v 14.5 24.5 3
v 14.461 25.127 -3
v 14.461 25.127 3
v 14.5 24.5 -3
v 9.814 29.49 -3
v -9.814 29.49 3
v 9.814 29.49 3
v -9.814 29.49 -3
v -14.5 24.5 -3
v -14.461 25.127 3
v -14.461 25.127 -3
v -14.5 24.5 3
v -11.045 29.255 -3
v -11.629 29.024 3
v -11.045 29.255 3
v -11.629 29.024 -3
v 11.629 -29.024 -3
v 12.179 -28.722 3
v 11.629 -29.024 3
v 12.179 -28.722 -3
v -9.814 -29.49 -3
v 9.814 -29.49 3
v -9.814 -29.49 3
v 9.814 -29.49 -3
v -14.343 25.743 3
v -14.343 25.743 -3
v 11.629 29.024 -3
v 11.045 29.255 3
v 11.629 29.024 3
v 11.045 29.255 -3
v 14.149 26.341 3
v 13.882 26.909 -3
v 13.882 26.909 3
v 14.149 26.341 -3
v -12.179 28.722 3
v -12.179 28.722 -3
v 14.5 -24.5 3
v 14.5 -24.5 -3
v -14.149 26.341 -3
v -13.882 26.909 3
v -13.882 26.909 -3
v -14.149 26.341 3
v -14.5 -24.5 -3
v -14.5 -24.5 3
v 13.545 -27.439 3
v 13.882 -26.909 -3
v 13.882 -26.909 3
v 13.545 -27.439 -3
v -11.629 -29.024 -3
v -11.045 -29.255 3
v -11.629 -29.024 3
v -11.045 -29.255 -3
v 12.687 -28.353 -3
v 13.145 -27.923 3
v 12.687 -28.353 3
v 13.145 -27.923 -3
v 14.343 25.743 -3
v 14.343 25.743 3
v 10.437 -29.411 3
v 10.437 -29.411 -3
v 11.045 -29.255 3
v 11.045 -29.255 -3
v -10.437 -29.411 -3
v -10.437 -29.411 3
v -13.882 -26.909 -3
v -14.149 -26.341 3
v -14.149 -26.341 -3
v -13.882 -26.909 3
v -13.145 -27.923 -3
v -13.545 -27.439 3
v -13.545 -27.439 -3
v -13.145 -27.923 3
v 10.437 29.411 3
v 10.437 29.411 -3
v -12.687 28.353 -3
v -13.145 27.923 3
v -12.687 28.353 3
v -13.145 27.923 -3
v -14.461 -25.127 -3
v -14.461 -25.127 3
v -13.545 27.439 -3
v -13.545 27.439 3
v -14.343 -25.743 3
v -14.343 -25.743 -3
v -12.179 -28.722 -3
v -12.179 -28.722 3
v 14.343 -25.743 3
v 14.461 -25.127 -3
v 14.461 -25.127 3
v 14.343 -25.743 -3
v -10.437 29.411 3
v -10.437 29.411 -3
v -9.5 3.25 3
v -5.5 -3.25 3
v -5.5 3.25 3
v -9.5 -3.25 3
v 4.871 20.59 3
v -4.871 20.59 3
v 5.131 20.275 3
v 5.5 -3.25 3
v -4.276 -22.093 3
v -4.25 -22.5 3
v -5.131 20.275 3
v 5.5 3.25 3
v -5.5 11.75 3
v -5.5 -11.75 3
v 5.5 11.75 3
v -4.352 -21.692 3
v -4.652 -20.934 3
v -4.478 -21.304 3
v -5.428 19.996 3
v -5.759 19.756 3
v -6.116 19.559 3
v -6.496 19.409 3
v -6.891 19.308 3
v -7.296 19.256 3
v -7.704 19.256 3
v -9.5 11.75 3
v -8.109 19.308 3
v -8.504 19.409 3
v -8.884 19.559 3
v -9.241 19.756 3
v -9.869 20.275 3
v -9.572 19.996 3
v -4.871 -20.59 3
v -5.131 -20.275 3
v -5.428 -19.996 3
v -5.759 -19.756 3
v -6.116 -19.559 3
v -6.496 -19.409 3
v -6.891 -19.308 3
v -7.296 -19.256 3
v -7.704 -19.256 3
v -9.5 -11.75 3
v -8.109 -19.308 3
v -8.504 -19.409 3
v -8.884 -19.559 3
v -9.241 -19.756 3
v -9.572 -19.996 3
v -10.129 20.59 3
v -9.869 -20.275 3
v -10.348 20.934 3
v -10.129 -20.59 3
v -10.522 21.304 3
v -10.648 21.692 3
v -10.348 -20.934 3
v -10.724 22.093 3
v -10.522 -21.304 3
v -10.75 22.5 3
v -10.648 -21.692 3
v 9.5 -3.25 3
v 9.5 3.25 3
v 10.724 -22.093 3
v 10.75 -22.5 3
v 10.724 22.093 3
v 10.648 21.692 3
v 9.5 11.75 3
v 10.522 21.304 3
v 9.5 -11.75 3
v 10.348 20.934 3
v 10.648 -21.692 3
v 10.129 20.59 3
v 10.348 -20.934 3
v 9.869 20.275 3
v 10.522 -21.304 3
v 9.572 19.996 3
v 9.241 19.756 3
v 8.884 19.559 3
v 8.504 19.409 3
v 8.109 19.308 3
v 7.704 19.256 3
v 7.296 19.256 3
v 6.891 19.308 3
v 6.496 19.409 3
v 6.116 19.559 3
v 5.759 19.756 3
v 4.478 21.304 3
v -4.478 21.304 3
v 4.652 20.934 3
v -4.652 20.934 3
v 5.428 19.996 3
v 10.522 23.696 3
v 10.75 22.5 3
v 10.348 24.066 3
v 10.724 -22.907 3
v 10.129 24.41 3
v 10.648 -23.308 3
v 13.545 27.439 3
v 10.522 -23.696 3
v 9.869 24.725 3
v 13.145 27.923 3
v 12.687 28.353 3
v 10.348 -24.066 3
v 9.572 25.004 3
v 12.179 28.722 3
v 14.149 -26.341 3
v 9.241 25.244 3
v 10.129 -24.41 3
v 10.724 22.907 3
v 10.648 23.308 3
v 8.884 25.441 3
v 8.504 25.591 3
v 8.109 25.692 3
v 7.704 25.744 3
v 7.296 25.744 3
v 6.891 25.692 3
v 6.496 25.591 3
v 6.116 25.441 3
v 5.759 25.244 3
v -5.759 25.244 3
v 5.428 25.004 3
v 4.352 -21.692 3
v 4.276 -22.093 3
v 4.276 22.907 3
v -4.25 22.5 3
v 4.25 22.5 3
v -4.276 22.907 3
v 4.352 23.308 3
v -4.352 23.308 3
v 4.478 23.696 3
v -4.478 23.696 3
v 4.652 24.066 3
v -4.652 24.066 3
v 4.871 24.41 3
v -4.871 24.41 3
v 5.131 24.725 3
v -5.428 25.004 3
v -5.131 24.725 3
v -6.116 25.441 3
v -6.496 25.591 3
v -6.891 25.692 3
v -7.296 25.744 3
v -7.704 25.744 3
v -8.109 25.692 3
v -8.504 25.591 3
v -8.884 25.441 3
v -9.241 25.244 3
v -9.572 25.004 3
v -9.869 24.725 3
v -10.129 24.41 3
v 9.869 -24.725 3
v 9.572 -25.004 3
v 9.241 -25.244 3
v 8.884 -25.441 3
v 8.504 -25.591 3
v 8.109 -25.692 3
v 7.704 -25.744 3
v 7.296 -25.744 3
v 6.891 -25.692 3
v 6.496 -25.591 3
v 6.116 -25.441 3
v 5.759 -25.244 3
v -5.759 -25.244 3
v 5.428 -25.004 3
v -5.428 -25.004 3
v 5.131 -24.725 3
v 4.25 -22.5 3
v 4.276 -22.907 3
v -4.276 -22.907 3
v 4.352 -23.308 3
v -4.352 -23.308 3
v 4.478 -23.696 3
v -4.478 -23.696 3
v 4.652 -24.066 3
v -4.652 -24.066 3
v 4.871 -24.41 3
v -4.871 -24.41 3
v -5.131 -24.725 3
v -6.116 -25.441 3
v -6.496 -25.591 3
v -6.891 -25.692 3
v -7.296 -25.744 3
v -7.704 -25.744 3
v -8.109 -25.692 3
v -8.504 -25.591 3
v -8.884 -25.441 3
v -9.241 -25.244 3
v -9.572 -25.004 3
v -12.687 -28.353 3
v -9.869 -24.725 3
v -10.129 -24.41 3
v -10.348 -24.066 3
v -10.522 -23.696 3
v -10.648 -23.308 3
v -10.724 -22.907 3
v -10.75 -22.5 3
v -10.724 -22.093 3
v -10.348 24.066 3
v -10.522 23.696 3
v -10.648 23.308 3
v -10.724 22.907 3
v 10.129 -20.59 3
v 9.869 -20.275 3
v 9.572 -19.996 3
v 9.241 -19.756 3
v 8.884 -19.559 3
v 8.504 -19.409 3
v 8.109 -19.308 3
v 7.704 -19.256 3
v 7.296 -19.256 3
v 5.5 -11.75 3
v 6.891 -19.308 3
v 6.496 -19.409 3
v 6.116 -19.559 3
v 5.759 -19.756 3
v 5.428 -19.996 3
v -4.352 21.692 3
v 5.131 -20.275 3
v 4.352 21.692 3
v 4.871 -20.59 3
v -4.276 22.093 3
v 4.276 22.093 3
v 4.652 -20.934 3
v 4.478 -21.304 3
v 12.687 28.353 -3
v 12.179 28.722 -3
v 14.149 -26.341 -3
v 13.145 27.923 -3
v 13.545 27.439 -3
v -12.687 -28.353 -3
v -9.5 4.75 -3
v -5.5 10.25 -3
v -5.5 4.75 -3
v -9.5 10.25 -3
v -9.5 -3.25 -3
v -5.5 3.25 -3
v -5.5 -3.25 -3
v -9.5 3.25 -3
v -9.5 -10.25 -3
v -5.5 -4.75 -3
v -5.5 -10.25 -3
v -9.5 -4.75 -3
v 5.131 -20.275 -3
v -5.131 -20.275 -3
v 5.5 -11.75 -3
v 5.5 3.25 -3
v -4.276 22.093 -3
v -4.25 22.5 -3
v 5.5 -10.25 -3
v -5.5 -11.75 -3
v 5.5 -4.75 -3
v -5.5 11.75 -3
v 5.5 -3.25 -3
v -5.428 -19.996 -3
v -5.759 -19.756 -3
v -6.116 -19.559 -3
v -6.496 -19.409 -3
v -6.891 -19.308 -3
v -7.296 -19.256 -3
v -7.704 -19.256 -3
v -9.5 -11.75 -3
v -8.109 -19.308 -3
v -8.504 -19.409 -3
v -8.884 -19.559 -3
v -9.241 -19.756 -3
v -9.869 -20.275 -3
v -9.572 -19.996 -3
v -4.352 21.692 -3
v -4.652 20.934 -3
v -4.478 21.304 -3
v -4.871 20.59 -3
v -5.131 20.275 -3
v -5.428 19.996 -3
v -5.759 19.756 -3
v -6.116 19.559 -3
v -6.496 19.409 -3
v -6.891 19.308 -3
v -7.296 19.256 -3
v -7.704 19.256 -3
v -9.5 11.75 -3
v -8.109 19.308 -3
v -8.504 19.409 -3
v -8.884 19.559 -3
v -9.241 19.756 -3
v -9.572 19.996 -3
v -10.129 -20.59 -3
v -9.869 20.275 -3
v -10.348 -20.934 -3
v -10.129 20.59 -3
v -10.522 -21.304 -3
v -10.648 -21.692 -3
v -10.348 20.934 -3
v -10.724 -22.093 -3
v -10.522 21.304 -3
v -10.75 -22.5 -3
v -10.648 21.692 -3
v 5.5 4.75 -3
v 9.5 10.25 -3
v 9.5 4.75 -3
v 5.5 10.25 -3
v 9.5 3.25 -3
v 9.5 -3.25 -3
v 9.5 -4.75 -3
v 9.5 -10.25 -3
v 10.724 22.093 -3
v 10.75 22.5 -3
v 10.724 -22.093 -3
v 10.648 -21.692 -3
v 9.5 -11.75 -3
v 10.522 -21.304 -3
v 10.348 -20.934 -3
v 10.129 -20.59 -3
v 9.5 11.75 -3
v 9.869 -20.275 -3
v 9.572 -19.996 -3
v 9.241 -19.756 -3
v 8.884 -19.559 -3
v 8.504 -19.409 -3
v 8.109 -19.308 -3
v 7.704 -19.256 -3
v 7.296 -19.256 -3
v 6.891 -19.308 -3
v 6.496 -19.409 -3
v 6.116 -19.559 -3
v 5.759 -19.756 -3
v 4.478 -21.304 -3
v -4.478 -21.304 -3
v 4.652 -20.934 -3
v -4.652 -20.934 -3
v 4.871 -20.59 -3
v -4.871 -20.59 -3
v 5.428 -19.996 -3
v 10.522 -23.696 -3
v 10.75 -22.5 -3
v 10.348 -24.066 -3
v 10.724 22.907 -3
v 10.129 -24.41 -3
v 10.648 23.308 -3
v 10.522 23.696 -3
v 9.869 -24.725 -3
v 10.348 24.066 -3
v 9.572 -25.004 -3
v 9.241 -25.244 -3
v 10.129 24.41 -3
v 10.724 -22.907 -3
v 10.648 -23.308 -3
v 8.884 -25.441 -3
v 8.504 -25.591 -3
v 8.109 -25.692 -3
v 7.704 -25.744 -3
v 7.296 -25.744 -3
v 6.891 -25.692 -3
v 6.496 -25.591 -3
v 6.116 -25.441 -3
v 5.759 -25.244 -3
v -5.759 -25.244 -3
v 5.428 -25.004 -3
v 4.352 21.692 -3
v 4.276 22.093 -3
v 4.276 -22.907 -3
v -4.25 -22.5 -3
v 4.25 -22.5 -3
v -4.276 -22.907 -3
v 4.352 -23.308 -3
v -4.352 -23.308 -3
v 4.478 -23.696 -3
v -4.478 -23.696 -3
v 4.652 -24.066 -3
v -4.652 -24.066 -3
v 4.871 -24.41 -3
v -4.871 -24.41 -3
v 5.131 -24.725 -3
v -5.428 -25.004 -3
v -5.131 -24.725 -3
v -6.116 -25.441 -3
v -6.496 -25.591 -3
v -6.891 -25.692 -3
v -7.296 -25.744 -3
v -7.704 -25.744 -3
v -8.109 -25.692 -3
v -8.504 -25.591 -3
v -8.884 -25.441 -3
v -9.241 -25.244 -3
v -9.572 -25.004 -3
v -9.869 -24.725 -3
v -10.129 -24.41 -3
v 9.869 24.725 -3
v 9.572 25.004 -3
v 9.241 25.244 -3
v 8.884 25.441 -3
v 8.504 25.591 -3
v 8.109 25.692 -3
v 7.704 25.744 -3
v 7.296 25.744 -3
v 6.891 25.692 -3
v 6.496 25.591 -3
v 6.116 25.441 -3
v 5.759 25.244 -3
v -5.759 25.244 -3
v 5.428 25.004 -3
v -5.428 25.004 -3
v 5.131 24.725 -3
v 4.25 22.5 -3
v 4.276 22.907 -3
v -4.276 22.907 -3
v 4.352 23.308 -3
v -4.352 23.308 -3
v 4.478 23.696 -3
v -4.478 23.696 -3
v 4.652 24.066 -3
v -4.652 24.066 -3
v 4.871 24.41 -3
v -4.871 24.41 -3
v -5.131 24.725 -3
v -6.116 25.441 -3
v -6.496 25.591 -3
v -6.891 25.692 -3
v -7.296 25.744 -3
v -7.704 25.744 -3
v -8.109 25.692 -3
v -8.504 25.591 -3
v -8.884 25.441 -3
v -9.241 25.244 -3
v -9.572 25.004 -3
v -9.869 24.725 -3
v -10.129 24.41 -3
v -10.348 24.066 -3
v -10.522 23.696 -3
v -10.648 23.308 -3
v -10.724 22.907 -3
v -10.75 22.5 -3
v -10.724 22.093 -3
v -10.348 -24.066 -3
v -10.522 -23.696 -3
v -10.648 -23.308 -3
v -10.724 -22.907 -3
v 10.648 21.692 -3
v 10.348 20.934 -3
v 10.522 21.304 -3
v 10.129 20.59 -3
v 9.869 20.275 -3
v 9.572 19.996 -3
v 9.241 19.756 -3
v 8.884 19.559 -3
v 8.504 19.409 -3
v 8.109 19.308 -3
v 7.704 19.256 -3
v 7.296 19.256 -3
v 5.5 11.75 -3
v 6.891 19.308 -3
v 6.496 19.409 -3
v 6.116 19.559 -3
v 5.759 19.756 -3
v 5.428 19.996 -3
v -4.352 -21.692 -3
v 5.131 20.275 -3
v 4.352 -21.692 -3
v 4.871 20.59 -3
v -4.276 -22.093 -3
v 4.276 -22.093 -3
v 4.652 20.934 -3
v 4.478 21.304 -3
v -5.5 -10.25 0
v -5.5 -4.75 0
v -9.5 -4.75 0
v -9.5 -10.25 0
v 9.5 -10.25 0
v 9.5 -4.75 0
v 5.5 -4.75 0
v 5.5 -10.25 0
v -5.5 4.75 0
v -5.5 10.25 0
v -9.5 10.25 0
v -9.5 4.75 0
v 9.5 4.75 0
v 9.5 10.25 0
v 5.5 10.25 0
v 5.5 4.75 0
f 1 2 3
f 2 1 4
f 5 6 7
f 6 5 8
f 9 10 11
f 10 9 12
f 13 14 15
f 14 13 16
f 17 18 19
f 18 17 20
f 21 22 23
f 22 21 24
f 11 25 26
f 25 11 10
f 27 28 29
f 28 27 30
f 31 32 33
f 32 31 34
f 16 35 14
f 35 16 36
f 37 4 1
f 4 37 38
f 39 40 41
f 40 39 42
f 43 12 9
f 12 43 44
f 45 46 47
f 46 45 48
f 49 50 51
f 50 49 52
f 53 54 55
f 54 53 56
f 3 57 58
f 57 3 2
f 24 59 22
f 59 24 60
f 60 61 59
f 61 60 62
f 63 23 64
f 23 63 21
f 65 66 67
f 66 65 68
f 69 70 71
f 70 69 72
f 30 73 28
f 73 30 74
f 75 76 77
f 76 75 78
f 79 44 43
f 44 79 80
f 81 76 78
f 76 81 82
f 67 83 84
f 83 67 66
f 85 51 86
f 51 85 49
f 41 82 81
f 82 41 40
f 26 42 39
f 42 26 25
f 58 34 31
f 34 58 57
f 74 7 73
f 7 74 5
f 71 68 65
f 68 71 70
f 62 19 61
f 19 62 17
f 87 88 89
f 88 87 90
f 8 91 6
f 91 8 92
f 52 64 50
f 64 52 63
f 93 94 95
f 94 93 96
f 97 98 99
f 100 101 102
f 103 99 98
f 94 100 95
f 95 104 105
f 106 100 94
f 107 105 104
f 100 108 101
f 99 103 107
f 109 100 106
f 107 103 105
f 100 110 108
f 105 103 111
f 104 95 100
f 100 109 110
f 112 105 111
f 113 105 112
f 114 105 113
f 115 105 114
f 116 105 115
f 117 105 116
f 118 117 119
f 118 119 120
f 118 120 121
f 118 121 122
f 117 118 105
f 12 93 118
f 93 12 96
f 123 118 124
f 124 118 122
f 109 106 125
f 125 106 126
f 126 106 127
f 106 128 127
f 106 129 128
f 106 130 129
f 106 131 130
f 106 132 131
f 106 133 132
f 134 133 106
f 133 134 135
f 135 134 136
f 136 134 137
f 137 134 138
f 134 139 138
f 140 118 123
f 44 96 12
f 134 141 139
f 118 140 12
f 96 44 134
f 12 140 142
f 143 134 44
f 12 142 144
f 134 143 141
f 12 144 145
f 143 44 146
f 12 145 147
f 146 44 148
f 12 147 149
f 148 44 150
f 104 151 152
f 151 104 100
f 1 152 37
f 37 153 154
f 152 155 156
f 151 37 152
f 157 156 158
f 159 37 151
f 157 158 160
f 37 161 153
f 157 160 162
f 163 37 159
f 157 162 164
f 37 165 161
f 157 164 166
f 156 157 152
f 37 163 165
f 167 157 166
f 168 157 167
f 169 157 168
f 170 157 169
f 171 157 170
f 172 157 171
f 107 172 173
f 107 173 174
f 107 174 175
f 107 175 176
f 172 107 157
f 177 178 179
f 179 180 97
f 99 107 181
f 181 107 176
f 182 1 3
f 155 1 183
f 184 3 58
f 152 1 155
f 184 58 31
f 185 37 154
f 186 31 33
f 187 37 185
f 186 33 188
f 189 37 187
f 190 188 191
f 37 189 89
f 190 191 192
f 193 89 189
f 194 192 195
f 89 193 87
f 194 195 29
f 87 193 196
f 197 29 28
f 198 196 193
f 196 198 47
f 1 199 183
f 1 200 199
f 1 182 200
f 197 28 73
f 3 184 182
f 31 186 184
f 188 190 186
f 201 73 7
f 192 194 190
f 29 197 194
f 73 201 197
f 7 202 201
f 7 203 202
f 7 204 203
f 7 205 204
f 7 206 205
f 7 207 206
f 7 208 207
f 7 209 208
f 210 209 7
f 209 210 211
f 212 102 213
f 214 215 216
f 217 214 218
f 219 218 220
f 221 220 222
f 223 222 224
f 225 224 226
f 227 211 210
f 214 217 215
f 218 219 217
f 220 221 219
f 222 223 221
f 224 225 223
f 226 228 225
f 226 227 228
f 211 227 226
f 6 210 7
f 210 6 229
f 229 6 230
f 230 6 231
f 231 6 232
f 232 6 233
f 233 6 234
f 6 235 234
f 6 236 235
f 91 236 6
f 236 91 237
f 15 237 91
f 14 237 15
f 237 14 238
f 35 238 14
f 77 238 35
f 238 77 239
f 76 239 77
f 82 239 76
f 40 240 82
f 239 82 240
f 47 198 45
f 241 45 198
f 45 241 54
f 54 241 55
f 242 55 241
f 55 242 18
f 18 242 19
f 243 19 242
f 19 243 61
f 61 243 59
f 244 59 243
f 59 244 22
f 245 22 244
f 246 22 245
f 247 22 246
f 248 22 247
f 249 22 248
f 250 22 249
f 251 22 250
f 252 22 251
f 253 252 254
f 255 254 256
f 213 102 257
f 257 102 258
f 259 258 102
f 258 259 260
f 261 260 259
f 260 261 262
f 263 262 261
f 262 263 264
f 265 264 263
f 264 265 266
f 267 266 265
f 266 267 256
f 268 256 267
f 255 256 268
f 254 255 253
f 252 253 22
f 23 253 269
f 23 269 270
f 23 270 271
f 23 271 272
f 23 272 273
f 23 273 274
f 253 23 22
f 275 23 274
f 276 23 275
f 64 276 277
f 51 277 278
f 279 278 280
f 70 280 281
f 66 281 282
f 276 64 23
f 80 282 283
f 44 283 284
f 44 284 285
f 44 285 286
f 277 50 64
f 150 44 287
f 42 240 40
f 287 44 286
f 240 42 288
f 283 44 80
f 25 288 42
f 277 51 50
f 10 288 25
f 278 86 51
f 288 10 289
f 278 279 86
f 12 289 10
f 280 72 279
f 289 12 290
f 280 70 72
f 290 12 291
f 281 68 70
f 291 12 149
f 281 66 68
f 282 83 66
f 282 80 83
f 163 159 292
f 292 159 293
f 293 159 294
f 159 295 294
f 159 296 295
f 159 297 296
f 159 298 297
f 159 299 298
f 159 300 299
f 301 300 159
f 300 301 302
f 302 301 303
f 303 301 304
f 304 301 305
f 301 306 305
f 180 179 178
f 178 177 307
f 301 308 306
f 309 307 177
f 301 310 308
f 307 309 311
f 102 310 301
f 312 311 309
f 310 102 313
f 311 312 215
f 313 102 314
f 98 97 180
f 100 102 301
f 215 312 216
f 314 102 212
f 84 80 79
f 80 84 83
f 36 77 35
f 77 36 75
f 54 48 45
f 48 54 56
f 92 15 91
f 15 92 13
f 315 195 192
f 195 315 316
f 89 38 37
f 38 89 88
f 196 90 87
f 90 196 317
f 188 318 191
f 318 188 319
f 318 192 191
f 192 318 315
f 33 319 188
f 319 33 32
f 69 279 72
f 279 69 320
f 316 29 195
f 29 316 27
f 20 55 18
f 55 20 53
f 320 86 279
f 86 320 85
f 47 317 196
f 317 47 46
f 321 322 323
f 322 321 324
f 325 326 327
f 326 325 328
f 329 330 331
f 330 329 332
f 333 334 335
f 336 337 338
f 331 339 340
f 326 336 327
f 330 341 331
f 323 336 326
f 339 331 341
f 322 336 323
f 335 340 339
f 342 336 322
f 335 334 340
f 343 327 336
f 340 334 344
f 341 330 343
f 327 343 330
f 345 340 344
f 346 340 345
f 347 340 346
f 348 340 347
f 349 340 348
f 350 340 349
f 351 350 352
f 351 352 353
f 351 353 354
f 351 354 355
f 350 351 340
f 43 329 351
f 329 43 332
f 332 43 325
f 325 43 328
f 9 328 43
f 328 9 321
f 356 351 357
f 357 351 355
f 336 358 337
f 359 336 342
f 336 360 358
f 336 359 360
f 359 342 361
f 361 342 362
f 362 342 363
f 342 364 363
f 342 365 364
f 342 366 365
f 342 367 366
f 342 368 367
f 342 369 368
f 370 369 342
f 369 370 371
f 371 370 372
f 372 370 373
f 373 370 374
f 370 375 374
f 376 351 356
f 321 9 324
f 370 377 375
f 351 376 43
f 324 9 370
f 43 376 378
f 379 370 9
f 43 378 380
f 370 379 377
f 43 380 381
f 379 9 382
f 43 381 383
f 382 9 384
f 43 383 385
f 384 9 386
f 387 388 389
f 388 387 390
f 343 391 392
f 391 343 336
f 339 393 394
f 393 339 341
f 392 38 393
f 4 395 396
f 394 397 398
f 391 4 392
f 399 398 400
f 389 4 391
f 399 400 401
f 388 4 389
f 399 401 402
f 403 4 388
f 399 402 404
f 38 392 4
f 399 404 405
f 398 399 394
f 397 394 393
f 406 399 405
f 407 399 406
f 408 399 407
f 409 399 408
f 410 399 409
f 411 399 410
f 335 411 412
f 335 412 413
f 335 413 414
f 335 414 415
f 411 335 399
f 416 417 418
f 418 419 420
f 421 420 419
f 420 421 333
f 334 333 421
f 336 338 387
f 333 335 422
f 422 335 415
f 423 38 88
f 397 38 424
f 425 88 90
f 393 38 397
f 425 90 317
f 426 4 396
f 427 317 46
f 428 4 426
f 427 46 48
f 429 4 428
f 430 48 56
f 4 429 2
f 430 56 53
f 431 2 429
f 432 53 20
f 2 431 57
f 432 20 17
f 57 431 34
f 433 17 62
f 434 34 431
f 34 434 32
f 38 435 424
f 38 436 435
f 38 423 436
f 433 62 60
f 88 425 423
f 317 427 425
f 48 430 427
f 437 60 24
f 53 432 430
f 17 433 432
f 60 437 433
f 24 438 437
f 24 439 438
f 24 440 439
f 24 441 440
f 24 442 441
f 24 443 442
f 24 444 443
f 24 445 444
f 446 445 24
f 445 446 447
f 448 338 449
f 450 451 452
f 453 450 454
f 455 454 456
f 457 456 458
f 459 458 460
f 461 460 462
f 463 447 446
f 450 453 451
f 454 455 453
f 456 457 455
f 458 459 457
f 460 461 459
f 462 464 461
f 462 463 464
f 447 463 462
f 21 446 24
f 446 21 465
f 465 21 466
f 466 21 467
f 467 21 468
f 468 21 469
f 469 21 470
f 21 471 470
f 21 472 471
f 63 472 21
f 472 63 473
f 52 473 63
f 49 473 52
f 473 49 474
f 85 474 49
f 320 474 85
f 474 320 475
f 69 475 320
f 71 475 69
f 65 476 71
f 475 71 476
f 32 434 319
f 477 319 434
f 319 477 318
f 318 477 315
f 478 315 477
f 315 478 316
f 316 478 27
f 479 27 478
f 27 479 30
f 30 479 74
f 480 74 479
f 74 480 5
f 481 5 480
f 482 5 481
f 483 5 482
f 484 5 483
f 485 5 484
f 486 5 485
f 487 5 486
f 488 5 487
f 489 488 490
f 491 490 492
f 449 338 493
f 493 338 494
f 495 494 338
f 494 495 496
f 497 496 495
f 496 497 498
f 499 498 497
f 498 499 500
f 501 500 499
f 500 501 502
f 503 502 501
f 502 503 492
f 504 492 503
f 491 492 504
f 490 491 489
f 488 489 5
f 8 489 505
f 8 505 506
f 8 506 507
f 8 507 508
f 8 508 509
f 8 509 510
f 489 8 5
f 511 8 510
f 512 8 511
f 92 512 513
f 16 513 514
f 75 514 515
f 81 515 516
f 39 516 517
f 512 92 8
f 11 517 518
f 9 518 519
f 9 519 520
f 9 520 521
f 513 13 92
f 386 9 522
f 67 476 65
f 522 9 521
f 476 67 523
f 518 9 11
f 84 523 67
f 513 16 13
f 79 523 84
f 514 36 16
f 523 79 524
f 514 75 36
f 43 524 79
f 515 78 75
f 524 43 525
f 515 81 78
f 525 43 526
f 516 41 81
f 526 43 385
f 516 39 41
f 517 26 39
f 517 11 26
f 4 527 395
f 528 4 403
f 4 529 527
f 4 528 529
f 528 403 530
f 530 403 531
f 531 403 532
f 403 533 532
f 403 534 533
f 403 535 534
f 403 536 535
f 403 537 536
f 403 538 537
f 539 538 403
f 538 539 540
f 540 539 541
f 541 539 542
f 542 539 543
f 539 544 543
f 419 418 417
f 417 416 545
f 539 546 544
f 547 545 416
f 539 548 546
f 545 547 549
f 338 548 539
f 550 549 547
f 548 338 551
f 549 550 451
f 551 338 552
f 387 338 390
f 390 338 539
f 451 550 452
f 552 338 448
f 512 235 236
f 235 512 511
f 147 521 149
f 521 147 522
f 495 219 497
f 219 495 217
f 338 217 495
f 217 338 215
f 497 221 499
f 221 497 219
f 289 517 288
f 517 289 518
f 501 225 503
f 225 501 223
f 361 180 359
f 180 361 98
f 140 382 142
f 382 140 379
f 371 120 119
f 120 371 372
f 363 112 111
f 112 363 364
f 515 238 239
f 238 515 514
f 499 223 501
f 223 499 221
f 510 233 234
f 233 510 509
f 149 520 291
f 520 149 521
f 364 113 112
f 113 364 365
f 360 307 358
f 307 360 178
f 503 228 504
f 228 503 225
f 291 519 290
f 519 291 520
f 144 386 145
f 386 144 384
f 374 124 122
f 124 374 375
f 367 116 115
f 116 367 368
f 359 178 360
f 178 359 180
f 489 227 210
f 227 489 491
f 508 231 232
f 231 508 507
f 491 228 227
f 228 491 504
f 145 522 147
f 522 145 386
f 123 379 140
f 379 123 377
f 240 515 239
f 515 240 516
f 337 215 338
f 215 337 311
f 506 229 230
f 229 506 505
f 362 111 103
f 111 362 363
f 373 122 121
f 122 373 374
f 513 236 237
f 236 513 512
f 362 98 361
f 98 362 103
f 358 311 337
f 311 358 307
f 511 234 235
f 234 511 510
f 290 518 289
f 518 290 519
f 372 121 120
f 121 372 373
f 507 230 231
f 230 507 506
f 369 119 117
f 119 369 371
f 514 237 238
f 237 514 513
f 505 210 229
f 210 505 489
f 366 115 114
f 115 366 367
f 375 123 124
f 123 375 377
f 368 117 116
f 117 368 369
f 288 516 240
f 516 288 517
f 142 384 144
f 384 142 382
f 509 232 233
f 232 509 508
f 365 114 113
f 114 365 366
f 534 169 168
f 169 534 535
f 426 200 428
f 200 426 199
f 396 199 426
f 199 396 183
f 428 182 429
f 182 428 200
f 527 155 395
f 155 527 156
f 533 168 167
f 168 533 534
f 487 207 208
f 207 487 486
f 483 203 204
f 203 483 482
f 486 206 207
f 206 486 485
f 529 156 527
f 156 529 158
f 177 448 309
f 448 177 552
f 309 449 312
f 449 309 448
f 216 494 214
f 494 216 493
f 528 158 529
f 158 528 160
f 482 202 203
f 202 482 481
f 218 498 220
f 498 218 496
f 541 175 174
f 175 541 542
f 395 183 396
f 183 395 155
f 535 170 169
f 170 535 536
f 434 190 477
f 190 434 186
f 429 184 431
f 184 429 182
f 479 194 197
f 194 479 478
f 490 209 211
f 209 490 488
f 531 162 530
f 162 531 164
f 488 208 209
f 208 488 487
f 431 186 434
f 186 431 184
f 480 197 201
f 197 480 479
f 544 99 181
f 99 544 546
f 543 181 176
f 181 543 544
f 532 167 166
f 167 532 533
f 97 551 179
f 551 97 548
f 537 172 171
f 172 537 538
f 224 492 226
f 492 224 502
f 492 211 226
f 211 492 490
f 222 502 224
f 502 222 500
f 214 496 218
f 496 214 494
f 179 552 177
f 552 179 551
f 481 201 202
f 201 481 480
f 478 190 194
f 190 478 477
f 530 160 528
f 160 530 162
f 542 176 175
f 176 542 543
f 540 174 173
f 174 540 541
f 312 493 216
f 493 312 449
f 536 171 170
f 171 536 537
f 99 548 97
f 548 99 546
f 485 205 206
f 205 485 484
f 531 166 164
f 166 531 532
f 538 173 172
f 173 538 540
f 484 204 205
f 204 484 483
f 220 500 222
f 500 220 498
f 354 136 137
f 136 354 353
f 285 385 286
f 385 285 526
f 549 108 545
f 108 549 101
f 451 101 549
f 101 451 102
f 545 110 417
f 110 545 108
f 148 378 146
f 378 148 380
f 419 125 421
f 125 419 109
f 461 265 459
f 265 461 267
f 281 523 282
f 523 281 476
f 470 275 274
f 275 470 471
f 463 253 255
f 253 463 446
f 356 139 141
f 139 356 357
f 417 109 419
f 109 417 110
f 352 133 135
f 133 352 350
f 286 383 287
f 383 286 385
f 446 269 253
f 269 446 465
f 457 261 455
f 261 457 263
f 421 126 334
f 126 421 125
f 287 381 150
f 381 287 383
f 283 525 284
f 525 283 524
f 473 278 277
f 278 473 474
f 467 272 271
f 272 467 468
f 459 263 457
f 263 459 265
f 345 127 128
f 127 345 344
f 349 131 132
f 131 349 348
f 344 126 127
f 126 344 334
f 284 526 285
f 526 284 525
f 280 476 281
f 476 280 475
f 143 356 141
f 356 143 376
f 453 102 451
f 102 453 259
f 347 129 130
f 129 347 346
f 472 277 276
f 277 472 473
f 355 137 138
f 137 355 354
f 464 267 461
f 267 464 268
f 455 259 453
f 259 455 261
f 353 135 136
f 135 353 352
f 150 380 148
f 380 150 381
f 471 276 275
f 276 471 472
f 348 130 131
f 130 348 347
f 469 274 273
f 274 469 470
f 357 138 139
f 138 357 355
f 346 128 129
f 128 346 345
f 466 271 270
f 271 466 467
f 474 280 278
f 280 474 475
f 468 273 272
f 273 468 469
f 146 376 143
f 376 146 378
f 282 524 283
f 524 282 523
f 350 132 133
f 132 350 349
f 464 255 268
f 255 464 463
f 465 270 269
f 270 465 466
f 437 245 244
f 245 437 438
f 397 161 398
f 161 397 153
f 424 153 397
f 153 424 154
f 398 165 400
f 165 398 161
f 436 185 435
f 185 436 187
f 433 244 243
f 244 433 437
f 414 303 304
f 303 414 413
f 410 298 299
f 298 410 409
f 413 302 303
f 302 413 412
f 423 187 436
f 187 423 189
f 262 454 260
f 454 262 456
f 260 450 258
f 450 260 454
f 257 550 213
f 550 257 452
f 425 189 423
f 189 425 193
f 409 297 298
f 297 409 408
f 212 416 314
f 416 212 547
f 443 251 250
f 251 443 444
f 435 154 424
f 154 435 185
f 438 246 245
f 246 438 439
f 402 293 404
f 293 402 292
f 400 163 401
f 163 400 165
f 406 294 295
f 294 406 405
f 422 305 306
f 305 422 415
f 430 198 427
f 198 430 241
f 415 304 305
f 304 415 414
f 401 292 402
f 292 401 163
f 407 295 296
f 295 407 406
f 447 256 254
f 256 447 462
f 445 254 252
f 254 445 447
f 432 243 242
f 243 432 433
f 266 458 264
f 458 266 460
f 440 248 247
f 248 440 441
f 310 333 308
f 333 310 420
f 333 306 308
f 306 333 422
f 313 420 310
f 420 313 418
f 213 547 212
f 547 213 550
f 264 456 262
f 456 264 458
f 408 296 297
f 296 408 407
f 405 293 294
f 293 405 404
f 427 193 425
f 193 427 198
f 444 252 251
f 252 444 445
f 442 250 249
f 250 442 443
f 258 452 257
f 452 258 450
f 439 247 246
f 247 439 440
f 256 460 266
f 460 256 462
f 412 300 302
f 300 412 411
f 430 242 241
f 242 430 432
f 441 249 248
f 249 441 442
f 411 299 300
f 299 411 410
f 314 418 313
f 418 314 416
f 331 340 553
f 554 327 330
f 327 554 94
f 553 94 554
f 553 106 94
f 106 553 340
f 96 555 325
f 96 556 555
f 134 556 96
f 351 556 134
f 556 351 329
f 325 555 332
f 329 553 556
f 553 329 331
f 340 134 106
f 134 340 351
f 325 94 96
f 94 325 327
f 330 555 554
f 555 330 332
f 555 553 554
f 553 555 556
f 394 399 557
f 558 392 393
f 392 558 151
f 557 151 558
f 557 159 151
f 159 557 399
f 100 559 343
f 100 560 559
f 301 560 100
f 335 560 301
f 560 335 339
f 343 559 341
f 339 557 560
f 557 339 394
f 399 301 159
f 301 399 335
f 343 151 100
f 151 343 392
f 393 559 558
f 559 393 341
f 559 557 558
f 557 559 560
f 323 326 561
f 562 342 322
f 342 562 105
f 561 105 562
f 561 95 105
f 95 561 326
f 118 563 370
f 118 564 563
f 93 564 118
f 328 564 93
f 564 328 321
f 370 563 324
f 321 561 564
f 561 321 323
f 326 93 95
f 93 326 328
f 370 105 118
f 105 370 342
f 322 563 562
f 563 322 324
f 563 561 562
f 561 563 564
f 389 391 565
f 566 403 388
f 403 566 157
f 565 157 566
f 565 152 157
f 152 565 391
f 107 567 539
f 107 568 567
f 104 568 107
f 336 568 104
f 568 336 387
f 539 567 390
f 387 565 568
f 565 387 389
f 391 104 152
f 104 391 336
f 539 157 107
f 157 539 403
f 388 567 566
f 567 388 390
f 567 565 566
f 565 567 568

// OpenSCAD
$fn = 50;


difference() {
	union() {
		translate(v = [0, 0, -3.0000000000]) {
			hull() {
				translate(v = [-9.5000000000, 24.5000000000, 0]) {
					cylinder(h = 6, r = 5);
				}
				translate(v = [9.5000000000, 24.5000000000, 0]) {
					cylinder(h = 6, r = 5);
				}
				translate(v = [-9.5000000000, -24.5000000000, 0]) {
					cylinder(h = 6, r = 5);
				}
				translate(v = [9.5000000000, -24.5000000000, 0]) {
					cylinder(h = 6, r = 5);
				}
			}
		}
		translate(v = [0, 0, -3.0000000000]) {
			hull() {
				translate(v = [-9.5000000000, 24.5000000000, 0]) {
					cylinder(h = 6, r = 5);
				}
				translate(v = [9.5000000000, 24.5000000000, 0]) {
					cylinder(h = 6, r = 5);
				}
				translate(v = [-9.5000000000, -24.5000000000, 0]) {
					cylinder(h = 6, r = 5);
				}
				translate(v = [9.5000000000, -24.5000000000, 0]) {
					cylinder(h = 6, r = 5);
				}
			}
		}
	}
	union() {
		translate(v = [-7.5000000000, 22.5000000000, -100.0000000000]) {
			cylinder(h = 200, r = 3.2500000000);
		}
		translate(v = [7.5000000000, 22.5000000000, -100.0000000000]) {
			cylinder(h = 200, r = 3.2500000000);
		}
		translate(v = [-7.5000000000, -22.5000000000, -100.0000000000]) {
			cylinder(h = 200, r = 3.2500000000);
		}
		translate(v = [7.5000000000, -22.5000000000, -100.0000000000]) {
			cylinder(h = 200, r = 3.2500000000);
		}
		translate(v = [-9.5000000000, -11.7500000000, -50]) {
			cube(size = [4, 1.5000000000, 100]);
		}
		translate(v = [-9.5000000000, -4.7500000000, -50]) {
			cube(size = [4, 1.5000000000, 100]);
		}
		translate(v = [-9.5000000000, -11.7500000000, 0]) {
			cube(size = [4, 8.5000000000, 3]);
		}
		translate(v = [5.5000000000, -11.7500000000, -50]) {
			cube(size = [4, 1.5000000000, 100]);
		}
		translate(v = [5.5000000000, -4.7500000000, -50]) {
			cube(size = [4, 1.5000000000, 100]);
		}
		translate(v = [5.5000000000, -11.7500000000, 0]) {
			cube(size = [4, 8.5000000000, 3]);
		}
		translate(v = [-9.5000000000, 3.2500000000, -50]) {
			cube(size = [4, 1.5000000000, 100]);
		}
		translate(v = [-9.5000000000, 10.2500000000, -50]) {
			cube(size = [4, 1.5000000000, 100]);
		}
		translate(v = [-9.5000000000, 3.2500000000, 0]) {
			cube(size = [4, 8.5000000000, 3]);
		}
		translate(v = [5.5000000000, 3.2500000000, -50]) {
			cube(size = [4, 1.5000000000, 100]);
		}
		translate(v = [5.5000000000, 10.2500000000, -50]) {
			cube(size = [4, 1.5000000000, 100]);
		}
		translate(v = [5.5000000000, 3.2500000000, 0]) {
			cube(size = [4, 8.5000000000, 3]);
		}
	}
}
